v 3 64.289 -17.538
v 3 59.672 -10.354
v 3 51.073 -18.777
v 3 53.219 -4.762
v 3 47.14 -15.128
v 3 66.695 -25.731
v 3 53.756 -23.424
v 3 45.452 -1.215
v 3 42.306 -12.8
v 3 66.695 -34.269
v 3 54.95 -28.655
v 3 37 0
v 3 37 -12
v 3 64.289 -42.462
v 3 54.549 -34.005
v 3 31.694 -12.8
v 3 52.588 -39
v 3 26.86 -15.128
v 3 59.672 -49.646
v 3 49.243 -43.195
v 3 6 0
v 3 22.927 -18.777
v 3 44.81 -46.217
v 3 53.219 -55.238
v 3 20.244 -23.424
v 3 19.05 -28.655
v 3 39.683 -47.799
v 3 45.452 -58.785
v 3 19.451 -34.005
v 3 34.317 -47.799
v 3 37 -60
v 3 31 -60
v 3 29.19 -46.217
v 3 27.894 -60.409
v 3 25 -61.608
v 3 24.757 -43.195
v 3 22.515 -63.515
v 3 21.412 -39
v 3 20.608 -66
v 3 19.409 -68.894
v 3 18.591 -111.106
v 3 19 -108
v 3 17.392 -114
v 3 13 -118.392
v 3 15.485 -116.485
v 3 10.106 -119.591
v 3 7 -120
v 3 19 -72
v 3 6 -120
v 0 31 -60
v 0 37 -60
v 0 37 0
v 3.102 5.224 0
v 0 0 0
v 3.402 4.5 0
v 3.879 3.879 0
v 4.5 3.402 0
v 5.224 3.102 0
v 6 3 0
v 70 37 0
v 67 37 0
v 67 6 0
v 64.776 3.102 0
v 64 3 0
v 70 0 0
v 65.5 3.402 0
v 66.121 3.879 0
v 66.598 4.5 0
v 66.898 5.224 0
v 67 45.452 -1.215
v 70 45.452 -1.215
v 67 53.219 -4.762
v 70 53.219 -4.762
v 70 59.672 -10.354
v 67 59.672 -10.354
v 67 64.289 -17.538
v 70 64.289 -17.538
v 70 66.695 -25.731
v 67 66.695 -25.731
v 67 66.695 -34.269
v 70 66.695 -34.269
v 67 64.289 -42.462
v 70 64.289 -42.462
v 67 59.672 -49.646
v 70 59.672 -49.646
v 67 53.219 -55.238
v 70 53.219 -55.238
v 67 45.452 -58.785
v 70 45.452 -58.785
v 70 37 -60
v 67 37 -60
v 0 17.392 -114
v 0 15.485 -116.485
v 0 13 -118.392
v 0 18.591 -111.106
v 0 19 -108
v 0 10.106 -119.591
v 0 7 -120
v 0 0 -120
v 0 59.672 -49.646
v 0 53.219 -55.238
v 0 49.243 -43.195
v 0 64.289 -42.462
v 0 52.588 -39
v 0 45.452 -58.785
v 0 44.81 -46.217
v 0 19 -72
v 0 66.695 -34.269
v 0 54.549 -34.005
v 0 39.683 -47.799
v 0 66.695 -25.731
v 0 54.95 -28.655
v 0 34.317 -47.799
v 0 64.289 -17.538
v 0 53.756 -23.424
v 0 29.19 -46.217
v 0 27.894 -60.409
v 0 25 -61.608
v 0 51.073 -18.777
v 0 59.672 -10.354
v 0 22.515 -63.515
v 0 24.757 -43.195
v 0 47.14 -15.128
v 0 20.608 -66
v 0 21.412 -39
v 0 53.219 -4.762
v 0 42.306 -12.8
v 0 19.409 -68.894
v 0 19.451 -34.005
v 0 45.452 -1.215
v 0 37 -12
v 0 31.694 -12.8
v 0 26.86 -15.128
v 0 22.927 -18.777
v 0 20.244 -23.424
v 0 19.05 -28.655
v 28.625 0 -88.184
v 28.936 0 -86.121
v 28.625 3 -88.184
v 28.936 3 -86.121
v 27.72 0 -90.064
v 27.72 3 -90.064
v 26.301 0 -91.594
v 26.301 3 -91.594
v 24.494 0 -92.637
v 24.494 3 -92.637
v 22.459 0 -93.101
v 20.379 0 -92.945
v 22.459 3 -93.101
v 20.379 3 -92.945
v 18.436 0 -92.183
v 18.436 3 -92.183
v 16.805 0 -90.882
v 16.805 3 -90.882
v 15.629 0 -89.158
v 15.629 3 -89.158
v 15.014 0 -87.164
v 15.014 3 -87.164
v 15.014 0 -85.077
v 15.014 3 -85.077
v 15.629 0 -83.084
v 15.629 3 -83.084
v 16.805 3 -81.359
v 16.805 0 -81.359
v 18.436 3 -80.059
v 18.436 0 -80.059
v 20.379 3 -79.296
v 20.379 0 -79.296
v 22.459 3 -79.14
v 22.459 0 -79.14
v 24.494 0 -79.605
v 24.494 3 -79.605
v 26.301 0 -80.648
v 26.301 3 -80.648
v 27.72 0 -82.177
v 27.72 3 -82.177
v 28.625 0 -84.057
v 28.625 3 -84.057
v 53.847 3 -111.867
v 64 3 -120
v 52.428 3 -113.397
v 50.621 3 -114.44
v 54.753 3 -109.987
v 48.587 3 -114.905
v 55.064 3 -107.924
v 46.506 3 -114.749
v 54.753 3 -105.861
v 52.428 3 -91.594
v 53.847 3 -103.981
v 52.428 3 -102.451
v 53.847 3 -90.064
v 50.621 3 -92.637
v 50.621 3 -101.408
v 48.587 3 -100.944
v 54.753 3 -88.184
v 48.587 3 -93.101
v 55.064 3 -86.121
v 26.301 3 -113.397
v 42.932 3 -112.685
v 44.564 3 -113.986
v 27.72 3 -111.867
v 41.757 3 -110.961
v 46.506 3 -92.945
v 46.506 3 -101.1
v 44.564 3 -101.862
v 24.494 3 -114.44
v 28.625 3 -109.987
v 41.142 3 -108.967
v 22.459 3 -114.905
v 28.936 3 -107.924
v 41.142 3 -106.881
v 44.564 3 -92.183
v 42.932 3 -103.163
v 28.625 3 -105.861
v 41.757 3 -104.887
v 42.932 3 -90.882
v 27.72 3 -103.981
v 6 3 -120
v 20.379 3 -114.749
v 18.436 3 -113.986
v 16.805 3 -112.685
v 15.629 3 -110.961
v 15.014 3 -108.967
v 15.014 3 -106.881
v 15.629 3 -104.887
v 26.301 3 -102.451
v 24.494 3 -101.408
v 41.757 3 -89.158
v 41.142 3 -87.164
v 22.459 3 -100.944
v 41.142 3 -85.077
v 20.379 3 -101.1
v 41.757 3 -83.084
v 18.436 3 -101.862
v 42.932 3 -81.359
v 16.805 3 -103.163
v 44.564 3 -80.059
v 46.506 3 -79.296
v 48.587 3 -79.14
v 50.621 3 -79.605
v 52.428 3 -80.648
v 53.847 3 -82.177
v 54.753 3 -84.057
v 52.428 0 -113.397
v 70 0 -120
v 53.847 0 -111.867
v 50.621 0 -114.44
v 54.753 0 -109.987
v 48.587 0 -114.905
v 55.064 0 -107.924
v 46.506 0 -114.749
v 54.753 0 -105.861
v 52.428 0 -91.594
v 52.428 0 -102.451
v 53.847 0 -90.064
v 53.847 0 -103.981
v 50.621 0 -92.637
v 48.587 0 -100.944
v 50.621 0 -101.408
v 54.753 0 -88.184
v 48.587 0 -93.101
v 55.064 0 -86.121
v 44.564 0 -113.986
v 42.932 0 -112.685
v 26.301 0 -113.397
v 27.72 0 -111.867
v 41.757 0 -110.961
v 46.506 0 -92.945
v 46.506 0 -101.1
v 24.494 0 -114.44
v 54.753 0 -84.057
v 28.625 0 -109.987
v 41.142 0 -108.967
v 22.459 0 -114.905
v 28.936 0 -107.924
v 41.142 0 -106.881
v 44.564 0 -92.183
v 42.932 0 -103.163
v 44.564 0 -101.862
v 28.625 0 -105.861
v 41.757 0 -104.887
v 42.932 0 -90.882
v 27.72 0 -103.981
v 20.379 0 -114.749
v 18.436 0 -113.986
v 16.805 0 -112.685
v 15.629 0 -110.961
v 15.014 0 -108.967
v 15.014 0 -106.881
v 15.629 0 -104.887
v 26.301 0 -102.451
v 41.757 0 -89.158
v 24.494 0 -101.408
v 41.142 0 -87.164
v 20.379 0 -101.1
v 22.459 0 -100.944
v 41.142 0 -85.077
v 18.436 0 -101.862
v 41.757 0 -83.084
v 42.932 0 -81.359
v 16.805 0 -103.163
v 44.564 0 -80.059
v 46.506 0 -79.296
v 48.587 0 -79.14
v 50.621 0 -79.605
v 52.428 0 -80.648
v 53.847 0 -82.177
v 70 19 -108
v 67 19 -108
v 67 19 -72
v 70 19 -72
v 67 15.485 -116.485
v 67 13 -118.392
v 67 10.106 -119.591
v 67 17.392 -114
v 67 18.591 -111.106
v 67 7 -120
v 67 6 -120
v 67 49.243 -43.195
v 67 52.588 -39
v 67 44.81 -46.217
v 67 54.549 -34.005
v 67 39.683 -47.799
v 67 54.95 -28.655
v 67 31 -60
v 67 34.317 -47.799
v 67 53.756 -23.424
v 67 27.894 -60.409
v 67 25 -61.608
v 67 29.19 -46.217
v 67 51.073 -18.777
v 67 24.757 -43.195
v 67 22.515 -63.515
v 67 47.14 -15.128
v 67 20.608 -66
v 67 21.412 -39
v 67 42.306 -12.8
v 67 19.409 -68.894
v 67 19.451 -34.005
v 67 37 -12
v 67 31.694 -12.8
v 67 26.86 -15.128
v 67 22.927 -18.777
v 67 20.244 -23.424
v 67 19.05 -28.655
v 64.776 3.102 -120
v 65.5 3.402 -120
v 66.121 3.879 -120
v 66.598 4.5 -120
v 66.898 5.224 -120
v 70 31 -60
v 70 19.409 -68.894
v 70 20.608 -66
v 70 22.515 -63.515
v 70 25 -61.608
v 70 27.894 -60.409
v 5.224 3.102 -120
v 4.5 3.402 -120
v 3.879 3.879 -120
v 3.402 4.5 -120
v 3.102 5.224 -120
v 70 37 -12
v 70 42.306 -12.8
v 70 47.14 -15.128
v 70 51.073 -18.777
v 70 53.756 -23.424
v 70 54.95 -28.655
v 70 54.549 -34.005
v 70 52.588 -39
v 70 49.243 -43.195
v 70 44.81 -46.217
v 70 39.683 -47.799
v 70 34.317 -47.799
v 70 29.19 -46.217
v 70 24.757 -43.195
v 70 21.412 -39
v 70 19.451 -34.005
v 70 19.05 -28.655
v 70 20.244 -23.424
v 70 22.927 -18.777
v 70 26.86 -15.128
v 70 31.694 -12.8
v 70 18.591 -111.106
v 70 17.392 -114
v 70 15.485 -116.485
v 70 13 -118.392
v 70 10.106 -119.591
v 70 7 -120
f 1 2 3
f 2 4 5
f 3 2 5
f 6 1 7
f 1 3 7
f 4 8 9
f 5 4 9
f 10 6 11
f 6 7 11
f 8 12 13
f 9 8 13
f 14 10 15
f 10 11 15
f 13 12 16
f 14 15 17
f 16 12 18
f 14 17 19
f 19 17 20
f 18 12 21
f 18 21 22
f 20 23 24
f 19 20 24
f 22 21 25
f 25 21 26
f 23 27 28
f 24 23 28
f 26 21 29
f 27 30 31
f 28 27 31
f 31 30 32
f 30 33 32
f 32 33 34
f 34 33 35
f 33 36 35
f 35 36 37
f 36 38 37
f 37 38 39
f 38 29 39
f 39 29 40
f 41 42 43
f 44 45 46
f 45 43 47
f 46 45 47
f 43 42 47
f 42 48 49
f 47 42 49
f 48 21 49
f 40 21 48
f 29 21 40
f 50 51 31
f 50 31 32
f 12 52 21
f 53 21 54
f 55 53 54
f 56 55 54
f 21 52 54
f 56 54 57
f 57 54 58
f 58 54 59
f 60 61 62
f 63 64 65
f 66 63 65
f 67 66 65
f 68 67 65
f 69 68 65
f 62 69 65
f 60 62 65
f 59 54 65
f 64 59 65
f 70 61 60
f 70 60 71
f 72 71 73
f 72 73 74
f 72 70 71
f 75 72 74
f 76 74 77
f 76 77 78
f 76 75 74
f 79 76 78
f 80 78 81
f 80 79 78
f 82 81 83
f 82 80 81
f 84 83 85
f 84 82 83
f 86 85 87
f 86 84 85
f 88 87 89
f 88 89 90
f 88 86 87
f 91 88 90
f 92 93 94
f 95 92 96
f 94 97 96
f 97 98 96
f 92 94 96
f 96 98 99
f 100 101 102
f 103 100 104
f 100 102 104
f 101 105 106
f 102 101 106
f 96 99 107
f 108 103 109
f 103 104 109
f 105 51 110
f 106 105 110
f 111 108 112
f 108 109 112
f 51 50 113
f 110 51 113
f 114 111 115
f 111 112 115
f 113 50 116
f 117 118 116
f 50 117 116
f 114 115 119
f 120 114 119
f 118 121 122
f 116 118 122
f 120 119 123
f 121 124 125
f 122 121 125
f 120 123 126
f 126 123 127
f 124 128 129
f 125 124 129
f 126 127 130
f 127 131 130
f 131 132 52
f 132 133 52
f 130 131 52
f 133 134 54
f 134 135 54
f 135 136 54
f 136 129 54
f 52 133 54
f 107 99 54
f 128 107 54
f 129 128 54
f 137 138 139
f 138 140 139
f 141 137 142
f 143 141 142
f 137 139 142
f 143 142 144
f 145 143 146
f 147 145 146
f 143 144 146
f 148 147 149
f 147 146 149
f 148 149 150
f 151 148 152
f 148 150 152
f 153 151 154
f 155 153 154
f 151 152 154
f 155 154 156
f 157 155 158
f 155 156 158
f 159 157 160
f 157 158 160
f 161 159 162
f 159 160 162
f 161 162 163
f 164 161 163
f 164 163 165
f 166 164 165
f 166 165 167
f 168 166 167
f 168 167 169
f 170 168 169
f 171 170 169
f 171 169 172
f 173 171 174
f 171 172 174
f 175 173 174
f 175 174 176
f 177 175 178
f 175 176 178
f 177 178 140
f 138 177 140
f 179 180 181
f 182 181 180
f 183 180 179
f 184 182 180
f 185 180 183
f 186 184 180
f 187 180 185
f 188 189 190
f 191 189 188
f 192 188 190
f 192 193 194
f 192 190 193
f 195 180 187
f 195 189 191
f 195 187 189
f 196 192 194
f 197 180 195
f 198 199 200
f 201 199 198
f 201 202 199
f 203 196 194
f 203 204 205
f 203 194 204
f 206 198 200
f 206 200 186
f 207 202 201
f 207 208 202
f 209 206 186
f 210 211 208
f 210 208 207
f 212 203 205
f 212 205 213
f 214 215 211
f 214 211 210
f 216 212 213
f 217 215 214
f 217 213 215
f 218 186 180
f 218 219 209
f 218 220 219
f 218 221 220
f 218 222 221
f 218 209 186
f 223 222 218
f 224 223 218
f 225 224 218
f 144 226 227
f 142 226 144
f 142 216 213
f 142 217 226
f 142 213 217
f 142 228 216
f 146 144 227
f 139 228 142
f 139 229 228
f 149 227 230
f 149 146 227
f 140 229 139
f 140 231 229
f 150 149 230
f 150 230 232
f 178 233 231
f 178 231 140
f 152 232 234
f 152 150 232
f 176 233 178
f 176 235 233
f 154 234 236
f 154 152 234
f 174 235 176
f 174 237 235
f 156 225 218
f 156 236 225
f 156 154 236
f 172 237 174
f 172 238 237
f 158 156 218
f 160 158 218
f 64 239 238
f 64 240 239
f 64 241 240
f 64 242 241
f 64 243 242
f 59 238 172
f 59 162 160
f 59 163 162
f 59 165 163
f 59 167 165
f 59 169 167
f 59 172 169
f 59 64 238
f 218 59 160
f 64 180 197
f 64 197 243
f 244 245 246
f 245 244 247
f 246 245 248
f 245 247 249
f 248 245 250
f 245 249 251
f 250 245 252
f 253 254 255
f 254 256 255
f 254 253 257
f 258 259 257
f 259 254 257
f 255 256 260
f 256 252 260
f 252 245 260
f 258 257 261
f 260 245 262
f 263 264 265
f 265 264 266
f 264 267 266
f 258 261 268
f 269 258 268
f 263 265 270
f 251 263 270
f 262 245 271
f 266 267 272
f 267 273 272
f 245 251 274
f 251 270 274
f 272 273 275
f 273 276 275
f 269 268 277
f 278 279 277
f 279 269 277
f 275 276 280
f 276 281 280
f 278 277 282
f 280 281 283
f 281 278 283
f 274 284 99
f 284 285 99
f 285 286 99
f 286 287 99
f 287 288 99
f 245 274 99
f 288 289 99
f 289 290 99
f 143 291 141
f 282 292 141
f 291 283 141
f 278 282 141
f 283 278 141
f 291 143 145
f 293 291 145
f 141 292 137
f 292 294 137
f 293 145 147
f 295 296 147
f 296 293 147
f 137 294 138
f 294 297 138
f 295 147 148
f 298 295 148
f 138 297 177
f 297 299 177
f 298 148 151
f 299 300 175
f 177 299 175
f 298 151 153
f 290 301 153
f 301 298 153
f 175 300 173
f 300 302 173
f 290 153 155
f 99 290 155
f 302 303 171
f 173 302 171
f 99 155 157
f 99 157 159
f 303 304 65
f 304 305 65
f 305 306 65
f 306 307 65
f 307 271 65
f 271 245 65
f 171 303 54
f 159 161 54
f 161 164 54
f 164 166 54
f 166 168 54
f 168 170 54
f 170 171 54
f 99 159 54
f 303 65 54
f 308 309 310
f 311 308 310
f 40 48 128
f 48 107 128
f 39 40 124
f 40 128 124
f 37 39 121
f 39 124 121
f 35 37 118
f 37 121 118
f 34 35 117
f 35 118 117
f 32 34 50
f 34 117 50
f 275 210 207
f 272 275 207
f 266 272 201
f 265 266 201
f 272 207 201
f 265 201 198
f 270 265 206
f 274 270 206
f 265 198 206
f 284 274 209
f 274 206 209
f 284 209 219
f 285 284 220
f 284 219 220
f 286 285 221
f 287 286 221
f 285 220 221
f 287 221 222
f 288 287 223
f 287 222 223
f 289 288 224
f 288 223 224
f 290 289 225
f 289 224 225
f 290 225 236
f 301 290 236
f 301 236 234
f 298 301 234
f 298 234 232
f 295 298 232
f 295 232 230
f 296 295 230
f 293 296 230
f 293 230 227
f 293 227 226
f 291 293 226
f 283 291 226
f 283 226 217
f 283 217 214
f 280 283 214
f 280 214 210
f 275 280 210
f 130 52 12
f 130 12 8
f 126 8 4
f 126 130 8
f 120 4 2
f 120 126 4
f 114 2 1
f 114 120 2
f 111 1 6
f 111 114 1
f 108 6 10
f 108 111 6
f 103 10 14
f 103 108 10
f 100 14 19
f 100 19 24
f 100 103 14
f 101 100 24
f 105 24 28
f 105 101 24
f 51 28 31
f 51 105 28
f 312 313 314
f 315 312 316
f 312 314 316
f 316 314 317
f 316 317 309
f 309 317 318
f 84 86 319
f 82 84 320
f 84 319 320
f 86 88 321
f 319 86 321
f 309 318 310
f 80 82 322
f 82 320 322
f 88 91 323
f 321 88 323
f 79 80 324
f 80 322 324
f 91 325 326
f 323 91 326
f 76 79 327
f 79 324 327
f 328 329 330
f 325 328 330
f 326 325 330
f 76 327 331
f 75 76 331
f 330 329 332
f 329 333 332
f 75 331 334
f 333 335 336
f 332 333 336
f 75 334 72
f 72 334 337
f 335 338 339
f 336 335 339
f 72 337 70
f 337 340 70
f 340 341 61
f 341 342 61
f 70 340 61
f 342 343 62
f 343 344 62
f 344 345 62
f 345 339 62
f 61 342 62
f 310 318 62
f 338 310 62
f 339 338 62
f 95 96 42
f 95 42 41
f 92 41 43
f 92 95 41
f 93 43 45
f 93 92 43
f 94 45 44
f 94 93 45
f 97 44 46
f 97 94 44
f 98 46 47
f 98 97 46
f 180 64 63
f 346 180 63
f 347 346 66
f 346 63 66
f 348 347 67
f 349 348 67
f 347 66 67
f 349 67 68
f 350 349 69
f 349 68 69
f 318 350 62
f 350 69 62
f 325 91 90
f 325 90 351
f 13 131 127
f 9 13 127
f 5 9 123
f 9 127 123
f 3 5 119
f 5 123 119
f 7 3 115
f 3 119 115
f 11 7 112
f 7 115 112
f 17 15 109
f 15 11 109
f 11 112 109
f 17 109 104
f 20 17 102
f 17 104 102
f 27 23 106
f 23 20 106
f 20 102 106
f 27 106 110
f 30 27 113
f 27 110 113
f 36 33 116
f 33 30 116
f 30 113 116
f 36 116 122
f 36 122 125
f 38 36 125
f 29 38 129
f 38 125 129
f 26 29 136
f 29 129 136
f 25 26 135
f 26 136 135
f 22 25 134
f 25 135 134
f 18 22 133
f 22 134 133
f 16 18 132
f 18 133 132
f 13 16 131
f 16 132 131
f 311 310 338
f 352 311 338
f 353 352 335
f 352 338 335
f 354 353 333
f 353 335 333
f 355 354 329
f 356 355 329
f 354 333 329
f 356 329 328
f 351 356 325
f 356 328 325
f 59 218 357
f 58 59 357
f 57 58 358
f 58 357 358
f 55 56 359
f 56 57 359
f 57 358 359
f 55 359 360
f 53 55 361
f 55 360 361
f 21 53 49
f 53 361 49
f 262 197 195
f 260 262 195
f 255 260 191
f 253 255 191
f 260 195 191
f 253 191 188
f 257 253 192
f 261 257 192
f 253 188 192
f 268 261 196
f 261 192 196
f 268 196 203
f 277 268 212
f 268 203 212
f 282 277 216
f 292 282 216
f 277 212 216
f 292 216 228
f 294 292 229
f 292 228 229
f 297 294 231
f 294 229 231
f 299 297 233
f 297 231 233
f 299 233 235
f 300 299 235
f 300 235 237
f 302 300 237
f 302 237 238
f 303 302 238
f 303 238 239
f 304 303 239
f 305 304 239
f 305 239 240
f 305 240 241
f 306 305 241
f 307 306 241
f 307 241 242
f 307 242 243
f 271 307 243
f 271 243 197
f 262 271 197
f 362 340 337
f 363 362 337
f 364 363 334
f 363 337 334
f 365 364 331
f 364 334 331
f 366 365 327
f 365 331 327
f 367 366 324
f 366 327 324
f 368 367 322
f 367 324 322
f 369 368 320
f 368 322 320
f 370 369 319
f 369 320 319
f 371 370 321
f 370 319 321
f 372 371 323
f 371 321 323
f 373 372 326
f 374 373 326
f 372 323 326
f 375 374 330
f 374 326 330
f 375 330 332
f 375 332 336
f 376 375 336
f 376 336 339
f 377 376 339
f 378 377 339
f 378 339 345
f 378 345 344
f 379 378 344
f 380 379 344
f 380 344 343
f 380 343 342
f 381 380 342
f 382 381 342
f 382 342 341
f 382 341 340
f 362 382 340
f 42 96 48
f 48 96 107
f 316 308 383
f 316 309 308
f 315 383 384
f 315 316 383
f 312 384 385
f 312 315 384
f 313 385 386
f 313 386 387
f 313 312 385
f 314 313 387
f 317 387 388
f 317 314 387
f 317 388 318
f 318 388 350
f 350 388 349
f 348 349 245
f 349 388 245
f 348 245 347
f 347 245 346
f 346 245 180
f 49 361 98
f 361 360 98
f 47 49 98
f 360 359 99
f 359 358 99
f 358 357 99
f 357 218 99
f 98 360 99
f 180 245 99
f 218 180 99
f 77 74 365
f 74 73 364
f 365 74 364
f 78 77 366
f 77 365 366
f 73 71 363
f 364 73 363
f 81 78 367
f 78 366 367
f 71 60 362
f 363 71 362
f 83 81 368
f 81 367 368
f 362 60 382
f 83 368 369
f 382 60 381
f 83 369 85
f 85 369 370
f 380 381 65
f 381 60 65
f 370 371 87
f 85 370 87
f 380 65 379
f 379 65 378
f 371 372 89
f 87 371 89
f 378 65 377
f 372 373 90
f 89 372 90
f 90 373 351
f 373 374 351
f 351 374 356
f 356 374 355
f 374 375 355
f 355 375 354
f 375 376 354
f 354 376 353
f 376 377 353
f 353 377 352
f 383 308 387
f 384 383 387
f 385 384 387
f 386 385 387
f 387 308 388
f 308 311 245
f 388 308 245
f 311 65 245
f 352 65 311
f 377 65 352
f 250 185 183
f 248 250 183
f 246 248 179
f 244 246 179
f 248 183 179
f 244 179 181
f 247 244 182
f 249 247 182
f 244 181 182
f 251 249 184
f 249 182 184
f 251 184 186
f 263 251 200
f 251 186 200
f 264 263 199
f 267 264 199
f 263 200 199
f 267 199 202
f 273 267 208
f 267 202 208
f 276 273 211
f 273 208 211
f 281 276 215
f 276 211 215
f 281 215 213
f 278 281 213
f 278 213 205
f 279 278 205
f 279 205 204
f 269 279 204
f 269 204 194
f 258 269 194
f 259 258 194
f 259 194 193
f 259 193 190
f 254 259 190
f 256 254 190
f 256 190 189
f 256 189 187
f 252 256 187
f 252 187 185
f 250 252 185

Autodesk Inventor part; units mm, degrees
ref_plane "YZ Plane" through (0, 0, 0) normal (1, 0, 0) x (0, 1, 0)
ref_plane "XZ Plane" through (0, 0, 0) normal (0, 1, 0) x (-1, 0, 0)
ref_plane "XY Plane" through (0, 0, 0) normal (0, 0, 1) x (1, 0, 0)
sketch "Sketch1" plane through (0, 0, 0) normal (0, 1, 0) x (-1, 0, 0)
  line L0 (0, 0) -> (-70, 0)
  line L1 (-70, 0) -> (-70, -120)
  line L2 (-70, -120) -> (0, -120)
  line L3 (0, -120) -> (0, 0)
  line L4 (0, -120) -> (-3, -120)
  line L5 (-3, -120) -> (-3, 0)
  line L6 (-70, 0) -> (-67, 0)
  line L7 (-67, 0) -> (-67, -120)
  dimension "d0" = 70
  dimension "d1" = 120
  dimension "d2" = 3
  dimension "d3" = 3
extrude "Extrusion1" add sketch "Sketch1" along normal blind 3
sketch "Sketch2" plane through (0, 3, 0) normal (0, 1, 0) x (1, 0, 0)
  line L0 (70, 0) -> (70, 120) projected
  line L1 (70, 120) -> (0, 120)
  line L2 (0, 120) -> (0, 0)
  line L3 (0, 0) -> (70, 0)
  line L4 (70, 0) -> (70, 120)
  line L5 (70, 120) -> (67, 120)
  line L6 (67, 120) -> (67, 0)
  line L7 (0, 0) -> (3, 0)
  line L8 (3, 0) -> (3, 120)
  dimension "d6" = 3
  dimension "d7" = 3
extrude "Extrusion2" add sketch "Sketch2" along normal blind 70 contours L3 L6 L1 L0 | L3 L2 L1 L8
sketch "Sketch3" plane through (0, 0, -120) normal (-1, 0, 0) x (0, 0, 1)
  line L0 (120, 0) -> (90, 0)
  line L1 (90, 0) -> (120, 0)
  line L2 (90, 0) -> (127, 0)
  line L3 (120, 0) -> (0, 0) projected
  line L4 (90, 0) -> (90, 37)
  circle A0 centre (90, 37) radius 18
  circle A1 centre (90, 37) radius 30
  line L5 (0, 0) -> (0, 7)
  line L6 (0, 3) -> (0, 73) projected
  line L7 (12, 19) -> (48, 19)
  arc A2 (12, 19) -> (0, 7) centre (12, 7) ccw
  line L8 (60, 37) -> (60, 31)
  arc A3 (48, 19) -> (60, 31) centre (48, 31) ccw
  line L9 (0, 7) -> (0, 73)
  line L10 (0, 73) -> (120, 73)
  line L11 (120, 73) -> (120, 37)
  point P0 (0, 19)
  point P1 (66, 19)
  dimension "d10" = 30
  dimension "d12" = 37
  dimension "d13" = 36
  dimension "d14" = 60
  dimension "d15" = 19
  dimension "d16" = 12
  dimension "d17" = 12
extrude "Extrusion3" cut sketch "Sketch3" against normal blind 70 contours L8 A3 L7 A2 L6 L10 L11 A1
sketch "Sketch4" plane through (0, 0, -120) normal (-1, 0, 0) x (0, 0, 1)
  line L0 (120, 0) -> (90, 0)
  line L1 (0, 0) -> (120, 0) projected
  line L2 (90, 0) -> (90, 37)
  circle A0 centre (90, 37) radius 18
  dimension "d20" = 30
  dimension "d21" = 37
  dimension "d22" = 36
extrude "Extrusion4" cut sketch "Sketch4" against normal blind 70
fillet "Fillet1" radius 3 2 edges at (3, 3, -60) (67, 3, -60)
sketch "Sketch5" plane through (0, 3, 0) normal (0, 1, 0) x (1, 0, 0)
  line L0 (67, 0) -> (67, 120) projected
  line L1 (67, 120) -> (56, 120)
  line L2 (70, 120) -> (0, 120) projected
  line L3 (3, 120) -> (3, 0) projected
  line L4 (3, 120) -> (5.3284, 120)
  line L5 (3, 120) -> (14, 120)
  circle A0 centre (48.0638, 86.1207) radius 7
  circle A1 centre (48.0638, 107.9241) radius 7
  circle A2 centre (21.9362, 86.1207) radius 7
  circle A3 centre (21.9362, 107.9241) radius 7
  point P0 (0, 0)
extrude "Extrusion5" cut sketch "Sketch5" against normal blind 70
properties part number "whateverthisis"
